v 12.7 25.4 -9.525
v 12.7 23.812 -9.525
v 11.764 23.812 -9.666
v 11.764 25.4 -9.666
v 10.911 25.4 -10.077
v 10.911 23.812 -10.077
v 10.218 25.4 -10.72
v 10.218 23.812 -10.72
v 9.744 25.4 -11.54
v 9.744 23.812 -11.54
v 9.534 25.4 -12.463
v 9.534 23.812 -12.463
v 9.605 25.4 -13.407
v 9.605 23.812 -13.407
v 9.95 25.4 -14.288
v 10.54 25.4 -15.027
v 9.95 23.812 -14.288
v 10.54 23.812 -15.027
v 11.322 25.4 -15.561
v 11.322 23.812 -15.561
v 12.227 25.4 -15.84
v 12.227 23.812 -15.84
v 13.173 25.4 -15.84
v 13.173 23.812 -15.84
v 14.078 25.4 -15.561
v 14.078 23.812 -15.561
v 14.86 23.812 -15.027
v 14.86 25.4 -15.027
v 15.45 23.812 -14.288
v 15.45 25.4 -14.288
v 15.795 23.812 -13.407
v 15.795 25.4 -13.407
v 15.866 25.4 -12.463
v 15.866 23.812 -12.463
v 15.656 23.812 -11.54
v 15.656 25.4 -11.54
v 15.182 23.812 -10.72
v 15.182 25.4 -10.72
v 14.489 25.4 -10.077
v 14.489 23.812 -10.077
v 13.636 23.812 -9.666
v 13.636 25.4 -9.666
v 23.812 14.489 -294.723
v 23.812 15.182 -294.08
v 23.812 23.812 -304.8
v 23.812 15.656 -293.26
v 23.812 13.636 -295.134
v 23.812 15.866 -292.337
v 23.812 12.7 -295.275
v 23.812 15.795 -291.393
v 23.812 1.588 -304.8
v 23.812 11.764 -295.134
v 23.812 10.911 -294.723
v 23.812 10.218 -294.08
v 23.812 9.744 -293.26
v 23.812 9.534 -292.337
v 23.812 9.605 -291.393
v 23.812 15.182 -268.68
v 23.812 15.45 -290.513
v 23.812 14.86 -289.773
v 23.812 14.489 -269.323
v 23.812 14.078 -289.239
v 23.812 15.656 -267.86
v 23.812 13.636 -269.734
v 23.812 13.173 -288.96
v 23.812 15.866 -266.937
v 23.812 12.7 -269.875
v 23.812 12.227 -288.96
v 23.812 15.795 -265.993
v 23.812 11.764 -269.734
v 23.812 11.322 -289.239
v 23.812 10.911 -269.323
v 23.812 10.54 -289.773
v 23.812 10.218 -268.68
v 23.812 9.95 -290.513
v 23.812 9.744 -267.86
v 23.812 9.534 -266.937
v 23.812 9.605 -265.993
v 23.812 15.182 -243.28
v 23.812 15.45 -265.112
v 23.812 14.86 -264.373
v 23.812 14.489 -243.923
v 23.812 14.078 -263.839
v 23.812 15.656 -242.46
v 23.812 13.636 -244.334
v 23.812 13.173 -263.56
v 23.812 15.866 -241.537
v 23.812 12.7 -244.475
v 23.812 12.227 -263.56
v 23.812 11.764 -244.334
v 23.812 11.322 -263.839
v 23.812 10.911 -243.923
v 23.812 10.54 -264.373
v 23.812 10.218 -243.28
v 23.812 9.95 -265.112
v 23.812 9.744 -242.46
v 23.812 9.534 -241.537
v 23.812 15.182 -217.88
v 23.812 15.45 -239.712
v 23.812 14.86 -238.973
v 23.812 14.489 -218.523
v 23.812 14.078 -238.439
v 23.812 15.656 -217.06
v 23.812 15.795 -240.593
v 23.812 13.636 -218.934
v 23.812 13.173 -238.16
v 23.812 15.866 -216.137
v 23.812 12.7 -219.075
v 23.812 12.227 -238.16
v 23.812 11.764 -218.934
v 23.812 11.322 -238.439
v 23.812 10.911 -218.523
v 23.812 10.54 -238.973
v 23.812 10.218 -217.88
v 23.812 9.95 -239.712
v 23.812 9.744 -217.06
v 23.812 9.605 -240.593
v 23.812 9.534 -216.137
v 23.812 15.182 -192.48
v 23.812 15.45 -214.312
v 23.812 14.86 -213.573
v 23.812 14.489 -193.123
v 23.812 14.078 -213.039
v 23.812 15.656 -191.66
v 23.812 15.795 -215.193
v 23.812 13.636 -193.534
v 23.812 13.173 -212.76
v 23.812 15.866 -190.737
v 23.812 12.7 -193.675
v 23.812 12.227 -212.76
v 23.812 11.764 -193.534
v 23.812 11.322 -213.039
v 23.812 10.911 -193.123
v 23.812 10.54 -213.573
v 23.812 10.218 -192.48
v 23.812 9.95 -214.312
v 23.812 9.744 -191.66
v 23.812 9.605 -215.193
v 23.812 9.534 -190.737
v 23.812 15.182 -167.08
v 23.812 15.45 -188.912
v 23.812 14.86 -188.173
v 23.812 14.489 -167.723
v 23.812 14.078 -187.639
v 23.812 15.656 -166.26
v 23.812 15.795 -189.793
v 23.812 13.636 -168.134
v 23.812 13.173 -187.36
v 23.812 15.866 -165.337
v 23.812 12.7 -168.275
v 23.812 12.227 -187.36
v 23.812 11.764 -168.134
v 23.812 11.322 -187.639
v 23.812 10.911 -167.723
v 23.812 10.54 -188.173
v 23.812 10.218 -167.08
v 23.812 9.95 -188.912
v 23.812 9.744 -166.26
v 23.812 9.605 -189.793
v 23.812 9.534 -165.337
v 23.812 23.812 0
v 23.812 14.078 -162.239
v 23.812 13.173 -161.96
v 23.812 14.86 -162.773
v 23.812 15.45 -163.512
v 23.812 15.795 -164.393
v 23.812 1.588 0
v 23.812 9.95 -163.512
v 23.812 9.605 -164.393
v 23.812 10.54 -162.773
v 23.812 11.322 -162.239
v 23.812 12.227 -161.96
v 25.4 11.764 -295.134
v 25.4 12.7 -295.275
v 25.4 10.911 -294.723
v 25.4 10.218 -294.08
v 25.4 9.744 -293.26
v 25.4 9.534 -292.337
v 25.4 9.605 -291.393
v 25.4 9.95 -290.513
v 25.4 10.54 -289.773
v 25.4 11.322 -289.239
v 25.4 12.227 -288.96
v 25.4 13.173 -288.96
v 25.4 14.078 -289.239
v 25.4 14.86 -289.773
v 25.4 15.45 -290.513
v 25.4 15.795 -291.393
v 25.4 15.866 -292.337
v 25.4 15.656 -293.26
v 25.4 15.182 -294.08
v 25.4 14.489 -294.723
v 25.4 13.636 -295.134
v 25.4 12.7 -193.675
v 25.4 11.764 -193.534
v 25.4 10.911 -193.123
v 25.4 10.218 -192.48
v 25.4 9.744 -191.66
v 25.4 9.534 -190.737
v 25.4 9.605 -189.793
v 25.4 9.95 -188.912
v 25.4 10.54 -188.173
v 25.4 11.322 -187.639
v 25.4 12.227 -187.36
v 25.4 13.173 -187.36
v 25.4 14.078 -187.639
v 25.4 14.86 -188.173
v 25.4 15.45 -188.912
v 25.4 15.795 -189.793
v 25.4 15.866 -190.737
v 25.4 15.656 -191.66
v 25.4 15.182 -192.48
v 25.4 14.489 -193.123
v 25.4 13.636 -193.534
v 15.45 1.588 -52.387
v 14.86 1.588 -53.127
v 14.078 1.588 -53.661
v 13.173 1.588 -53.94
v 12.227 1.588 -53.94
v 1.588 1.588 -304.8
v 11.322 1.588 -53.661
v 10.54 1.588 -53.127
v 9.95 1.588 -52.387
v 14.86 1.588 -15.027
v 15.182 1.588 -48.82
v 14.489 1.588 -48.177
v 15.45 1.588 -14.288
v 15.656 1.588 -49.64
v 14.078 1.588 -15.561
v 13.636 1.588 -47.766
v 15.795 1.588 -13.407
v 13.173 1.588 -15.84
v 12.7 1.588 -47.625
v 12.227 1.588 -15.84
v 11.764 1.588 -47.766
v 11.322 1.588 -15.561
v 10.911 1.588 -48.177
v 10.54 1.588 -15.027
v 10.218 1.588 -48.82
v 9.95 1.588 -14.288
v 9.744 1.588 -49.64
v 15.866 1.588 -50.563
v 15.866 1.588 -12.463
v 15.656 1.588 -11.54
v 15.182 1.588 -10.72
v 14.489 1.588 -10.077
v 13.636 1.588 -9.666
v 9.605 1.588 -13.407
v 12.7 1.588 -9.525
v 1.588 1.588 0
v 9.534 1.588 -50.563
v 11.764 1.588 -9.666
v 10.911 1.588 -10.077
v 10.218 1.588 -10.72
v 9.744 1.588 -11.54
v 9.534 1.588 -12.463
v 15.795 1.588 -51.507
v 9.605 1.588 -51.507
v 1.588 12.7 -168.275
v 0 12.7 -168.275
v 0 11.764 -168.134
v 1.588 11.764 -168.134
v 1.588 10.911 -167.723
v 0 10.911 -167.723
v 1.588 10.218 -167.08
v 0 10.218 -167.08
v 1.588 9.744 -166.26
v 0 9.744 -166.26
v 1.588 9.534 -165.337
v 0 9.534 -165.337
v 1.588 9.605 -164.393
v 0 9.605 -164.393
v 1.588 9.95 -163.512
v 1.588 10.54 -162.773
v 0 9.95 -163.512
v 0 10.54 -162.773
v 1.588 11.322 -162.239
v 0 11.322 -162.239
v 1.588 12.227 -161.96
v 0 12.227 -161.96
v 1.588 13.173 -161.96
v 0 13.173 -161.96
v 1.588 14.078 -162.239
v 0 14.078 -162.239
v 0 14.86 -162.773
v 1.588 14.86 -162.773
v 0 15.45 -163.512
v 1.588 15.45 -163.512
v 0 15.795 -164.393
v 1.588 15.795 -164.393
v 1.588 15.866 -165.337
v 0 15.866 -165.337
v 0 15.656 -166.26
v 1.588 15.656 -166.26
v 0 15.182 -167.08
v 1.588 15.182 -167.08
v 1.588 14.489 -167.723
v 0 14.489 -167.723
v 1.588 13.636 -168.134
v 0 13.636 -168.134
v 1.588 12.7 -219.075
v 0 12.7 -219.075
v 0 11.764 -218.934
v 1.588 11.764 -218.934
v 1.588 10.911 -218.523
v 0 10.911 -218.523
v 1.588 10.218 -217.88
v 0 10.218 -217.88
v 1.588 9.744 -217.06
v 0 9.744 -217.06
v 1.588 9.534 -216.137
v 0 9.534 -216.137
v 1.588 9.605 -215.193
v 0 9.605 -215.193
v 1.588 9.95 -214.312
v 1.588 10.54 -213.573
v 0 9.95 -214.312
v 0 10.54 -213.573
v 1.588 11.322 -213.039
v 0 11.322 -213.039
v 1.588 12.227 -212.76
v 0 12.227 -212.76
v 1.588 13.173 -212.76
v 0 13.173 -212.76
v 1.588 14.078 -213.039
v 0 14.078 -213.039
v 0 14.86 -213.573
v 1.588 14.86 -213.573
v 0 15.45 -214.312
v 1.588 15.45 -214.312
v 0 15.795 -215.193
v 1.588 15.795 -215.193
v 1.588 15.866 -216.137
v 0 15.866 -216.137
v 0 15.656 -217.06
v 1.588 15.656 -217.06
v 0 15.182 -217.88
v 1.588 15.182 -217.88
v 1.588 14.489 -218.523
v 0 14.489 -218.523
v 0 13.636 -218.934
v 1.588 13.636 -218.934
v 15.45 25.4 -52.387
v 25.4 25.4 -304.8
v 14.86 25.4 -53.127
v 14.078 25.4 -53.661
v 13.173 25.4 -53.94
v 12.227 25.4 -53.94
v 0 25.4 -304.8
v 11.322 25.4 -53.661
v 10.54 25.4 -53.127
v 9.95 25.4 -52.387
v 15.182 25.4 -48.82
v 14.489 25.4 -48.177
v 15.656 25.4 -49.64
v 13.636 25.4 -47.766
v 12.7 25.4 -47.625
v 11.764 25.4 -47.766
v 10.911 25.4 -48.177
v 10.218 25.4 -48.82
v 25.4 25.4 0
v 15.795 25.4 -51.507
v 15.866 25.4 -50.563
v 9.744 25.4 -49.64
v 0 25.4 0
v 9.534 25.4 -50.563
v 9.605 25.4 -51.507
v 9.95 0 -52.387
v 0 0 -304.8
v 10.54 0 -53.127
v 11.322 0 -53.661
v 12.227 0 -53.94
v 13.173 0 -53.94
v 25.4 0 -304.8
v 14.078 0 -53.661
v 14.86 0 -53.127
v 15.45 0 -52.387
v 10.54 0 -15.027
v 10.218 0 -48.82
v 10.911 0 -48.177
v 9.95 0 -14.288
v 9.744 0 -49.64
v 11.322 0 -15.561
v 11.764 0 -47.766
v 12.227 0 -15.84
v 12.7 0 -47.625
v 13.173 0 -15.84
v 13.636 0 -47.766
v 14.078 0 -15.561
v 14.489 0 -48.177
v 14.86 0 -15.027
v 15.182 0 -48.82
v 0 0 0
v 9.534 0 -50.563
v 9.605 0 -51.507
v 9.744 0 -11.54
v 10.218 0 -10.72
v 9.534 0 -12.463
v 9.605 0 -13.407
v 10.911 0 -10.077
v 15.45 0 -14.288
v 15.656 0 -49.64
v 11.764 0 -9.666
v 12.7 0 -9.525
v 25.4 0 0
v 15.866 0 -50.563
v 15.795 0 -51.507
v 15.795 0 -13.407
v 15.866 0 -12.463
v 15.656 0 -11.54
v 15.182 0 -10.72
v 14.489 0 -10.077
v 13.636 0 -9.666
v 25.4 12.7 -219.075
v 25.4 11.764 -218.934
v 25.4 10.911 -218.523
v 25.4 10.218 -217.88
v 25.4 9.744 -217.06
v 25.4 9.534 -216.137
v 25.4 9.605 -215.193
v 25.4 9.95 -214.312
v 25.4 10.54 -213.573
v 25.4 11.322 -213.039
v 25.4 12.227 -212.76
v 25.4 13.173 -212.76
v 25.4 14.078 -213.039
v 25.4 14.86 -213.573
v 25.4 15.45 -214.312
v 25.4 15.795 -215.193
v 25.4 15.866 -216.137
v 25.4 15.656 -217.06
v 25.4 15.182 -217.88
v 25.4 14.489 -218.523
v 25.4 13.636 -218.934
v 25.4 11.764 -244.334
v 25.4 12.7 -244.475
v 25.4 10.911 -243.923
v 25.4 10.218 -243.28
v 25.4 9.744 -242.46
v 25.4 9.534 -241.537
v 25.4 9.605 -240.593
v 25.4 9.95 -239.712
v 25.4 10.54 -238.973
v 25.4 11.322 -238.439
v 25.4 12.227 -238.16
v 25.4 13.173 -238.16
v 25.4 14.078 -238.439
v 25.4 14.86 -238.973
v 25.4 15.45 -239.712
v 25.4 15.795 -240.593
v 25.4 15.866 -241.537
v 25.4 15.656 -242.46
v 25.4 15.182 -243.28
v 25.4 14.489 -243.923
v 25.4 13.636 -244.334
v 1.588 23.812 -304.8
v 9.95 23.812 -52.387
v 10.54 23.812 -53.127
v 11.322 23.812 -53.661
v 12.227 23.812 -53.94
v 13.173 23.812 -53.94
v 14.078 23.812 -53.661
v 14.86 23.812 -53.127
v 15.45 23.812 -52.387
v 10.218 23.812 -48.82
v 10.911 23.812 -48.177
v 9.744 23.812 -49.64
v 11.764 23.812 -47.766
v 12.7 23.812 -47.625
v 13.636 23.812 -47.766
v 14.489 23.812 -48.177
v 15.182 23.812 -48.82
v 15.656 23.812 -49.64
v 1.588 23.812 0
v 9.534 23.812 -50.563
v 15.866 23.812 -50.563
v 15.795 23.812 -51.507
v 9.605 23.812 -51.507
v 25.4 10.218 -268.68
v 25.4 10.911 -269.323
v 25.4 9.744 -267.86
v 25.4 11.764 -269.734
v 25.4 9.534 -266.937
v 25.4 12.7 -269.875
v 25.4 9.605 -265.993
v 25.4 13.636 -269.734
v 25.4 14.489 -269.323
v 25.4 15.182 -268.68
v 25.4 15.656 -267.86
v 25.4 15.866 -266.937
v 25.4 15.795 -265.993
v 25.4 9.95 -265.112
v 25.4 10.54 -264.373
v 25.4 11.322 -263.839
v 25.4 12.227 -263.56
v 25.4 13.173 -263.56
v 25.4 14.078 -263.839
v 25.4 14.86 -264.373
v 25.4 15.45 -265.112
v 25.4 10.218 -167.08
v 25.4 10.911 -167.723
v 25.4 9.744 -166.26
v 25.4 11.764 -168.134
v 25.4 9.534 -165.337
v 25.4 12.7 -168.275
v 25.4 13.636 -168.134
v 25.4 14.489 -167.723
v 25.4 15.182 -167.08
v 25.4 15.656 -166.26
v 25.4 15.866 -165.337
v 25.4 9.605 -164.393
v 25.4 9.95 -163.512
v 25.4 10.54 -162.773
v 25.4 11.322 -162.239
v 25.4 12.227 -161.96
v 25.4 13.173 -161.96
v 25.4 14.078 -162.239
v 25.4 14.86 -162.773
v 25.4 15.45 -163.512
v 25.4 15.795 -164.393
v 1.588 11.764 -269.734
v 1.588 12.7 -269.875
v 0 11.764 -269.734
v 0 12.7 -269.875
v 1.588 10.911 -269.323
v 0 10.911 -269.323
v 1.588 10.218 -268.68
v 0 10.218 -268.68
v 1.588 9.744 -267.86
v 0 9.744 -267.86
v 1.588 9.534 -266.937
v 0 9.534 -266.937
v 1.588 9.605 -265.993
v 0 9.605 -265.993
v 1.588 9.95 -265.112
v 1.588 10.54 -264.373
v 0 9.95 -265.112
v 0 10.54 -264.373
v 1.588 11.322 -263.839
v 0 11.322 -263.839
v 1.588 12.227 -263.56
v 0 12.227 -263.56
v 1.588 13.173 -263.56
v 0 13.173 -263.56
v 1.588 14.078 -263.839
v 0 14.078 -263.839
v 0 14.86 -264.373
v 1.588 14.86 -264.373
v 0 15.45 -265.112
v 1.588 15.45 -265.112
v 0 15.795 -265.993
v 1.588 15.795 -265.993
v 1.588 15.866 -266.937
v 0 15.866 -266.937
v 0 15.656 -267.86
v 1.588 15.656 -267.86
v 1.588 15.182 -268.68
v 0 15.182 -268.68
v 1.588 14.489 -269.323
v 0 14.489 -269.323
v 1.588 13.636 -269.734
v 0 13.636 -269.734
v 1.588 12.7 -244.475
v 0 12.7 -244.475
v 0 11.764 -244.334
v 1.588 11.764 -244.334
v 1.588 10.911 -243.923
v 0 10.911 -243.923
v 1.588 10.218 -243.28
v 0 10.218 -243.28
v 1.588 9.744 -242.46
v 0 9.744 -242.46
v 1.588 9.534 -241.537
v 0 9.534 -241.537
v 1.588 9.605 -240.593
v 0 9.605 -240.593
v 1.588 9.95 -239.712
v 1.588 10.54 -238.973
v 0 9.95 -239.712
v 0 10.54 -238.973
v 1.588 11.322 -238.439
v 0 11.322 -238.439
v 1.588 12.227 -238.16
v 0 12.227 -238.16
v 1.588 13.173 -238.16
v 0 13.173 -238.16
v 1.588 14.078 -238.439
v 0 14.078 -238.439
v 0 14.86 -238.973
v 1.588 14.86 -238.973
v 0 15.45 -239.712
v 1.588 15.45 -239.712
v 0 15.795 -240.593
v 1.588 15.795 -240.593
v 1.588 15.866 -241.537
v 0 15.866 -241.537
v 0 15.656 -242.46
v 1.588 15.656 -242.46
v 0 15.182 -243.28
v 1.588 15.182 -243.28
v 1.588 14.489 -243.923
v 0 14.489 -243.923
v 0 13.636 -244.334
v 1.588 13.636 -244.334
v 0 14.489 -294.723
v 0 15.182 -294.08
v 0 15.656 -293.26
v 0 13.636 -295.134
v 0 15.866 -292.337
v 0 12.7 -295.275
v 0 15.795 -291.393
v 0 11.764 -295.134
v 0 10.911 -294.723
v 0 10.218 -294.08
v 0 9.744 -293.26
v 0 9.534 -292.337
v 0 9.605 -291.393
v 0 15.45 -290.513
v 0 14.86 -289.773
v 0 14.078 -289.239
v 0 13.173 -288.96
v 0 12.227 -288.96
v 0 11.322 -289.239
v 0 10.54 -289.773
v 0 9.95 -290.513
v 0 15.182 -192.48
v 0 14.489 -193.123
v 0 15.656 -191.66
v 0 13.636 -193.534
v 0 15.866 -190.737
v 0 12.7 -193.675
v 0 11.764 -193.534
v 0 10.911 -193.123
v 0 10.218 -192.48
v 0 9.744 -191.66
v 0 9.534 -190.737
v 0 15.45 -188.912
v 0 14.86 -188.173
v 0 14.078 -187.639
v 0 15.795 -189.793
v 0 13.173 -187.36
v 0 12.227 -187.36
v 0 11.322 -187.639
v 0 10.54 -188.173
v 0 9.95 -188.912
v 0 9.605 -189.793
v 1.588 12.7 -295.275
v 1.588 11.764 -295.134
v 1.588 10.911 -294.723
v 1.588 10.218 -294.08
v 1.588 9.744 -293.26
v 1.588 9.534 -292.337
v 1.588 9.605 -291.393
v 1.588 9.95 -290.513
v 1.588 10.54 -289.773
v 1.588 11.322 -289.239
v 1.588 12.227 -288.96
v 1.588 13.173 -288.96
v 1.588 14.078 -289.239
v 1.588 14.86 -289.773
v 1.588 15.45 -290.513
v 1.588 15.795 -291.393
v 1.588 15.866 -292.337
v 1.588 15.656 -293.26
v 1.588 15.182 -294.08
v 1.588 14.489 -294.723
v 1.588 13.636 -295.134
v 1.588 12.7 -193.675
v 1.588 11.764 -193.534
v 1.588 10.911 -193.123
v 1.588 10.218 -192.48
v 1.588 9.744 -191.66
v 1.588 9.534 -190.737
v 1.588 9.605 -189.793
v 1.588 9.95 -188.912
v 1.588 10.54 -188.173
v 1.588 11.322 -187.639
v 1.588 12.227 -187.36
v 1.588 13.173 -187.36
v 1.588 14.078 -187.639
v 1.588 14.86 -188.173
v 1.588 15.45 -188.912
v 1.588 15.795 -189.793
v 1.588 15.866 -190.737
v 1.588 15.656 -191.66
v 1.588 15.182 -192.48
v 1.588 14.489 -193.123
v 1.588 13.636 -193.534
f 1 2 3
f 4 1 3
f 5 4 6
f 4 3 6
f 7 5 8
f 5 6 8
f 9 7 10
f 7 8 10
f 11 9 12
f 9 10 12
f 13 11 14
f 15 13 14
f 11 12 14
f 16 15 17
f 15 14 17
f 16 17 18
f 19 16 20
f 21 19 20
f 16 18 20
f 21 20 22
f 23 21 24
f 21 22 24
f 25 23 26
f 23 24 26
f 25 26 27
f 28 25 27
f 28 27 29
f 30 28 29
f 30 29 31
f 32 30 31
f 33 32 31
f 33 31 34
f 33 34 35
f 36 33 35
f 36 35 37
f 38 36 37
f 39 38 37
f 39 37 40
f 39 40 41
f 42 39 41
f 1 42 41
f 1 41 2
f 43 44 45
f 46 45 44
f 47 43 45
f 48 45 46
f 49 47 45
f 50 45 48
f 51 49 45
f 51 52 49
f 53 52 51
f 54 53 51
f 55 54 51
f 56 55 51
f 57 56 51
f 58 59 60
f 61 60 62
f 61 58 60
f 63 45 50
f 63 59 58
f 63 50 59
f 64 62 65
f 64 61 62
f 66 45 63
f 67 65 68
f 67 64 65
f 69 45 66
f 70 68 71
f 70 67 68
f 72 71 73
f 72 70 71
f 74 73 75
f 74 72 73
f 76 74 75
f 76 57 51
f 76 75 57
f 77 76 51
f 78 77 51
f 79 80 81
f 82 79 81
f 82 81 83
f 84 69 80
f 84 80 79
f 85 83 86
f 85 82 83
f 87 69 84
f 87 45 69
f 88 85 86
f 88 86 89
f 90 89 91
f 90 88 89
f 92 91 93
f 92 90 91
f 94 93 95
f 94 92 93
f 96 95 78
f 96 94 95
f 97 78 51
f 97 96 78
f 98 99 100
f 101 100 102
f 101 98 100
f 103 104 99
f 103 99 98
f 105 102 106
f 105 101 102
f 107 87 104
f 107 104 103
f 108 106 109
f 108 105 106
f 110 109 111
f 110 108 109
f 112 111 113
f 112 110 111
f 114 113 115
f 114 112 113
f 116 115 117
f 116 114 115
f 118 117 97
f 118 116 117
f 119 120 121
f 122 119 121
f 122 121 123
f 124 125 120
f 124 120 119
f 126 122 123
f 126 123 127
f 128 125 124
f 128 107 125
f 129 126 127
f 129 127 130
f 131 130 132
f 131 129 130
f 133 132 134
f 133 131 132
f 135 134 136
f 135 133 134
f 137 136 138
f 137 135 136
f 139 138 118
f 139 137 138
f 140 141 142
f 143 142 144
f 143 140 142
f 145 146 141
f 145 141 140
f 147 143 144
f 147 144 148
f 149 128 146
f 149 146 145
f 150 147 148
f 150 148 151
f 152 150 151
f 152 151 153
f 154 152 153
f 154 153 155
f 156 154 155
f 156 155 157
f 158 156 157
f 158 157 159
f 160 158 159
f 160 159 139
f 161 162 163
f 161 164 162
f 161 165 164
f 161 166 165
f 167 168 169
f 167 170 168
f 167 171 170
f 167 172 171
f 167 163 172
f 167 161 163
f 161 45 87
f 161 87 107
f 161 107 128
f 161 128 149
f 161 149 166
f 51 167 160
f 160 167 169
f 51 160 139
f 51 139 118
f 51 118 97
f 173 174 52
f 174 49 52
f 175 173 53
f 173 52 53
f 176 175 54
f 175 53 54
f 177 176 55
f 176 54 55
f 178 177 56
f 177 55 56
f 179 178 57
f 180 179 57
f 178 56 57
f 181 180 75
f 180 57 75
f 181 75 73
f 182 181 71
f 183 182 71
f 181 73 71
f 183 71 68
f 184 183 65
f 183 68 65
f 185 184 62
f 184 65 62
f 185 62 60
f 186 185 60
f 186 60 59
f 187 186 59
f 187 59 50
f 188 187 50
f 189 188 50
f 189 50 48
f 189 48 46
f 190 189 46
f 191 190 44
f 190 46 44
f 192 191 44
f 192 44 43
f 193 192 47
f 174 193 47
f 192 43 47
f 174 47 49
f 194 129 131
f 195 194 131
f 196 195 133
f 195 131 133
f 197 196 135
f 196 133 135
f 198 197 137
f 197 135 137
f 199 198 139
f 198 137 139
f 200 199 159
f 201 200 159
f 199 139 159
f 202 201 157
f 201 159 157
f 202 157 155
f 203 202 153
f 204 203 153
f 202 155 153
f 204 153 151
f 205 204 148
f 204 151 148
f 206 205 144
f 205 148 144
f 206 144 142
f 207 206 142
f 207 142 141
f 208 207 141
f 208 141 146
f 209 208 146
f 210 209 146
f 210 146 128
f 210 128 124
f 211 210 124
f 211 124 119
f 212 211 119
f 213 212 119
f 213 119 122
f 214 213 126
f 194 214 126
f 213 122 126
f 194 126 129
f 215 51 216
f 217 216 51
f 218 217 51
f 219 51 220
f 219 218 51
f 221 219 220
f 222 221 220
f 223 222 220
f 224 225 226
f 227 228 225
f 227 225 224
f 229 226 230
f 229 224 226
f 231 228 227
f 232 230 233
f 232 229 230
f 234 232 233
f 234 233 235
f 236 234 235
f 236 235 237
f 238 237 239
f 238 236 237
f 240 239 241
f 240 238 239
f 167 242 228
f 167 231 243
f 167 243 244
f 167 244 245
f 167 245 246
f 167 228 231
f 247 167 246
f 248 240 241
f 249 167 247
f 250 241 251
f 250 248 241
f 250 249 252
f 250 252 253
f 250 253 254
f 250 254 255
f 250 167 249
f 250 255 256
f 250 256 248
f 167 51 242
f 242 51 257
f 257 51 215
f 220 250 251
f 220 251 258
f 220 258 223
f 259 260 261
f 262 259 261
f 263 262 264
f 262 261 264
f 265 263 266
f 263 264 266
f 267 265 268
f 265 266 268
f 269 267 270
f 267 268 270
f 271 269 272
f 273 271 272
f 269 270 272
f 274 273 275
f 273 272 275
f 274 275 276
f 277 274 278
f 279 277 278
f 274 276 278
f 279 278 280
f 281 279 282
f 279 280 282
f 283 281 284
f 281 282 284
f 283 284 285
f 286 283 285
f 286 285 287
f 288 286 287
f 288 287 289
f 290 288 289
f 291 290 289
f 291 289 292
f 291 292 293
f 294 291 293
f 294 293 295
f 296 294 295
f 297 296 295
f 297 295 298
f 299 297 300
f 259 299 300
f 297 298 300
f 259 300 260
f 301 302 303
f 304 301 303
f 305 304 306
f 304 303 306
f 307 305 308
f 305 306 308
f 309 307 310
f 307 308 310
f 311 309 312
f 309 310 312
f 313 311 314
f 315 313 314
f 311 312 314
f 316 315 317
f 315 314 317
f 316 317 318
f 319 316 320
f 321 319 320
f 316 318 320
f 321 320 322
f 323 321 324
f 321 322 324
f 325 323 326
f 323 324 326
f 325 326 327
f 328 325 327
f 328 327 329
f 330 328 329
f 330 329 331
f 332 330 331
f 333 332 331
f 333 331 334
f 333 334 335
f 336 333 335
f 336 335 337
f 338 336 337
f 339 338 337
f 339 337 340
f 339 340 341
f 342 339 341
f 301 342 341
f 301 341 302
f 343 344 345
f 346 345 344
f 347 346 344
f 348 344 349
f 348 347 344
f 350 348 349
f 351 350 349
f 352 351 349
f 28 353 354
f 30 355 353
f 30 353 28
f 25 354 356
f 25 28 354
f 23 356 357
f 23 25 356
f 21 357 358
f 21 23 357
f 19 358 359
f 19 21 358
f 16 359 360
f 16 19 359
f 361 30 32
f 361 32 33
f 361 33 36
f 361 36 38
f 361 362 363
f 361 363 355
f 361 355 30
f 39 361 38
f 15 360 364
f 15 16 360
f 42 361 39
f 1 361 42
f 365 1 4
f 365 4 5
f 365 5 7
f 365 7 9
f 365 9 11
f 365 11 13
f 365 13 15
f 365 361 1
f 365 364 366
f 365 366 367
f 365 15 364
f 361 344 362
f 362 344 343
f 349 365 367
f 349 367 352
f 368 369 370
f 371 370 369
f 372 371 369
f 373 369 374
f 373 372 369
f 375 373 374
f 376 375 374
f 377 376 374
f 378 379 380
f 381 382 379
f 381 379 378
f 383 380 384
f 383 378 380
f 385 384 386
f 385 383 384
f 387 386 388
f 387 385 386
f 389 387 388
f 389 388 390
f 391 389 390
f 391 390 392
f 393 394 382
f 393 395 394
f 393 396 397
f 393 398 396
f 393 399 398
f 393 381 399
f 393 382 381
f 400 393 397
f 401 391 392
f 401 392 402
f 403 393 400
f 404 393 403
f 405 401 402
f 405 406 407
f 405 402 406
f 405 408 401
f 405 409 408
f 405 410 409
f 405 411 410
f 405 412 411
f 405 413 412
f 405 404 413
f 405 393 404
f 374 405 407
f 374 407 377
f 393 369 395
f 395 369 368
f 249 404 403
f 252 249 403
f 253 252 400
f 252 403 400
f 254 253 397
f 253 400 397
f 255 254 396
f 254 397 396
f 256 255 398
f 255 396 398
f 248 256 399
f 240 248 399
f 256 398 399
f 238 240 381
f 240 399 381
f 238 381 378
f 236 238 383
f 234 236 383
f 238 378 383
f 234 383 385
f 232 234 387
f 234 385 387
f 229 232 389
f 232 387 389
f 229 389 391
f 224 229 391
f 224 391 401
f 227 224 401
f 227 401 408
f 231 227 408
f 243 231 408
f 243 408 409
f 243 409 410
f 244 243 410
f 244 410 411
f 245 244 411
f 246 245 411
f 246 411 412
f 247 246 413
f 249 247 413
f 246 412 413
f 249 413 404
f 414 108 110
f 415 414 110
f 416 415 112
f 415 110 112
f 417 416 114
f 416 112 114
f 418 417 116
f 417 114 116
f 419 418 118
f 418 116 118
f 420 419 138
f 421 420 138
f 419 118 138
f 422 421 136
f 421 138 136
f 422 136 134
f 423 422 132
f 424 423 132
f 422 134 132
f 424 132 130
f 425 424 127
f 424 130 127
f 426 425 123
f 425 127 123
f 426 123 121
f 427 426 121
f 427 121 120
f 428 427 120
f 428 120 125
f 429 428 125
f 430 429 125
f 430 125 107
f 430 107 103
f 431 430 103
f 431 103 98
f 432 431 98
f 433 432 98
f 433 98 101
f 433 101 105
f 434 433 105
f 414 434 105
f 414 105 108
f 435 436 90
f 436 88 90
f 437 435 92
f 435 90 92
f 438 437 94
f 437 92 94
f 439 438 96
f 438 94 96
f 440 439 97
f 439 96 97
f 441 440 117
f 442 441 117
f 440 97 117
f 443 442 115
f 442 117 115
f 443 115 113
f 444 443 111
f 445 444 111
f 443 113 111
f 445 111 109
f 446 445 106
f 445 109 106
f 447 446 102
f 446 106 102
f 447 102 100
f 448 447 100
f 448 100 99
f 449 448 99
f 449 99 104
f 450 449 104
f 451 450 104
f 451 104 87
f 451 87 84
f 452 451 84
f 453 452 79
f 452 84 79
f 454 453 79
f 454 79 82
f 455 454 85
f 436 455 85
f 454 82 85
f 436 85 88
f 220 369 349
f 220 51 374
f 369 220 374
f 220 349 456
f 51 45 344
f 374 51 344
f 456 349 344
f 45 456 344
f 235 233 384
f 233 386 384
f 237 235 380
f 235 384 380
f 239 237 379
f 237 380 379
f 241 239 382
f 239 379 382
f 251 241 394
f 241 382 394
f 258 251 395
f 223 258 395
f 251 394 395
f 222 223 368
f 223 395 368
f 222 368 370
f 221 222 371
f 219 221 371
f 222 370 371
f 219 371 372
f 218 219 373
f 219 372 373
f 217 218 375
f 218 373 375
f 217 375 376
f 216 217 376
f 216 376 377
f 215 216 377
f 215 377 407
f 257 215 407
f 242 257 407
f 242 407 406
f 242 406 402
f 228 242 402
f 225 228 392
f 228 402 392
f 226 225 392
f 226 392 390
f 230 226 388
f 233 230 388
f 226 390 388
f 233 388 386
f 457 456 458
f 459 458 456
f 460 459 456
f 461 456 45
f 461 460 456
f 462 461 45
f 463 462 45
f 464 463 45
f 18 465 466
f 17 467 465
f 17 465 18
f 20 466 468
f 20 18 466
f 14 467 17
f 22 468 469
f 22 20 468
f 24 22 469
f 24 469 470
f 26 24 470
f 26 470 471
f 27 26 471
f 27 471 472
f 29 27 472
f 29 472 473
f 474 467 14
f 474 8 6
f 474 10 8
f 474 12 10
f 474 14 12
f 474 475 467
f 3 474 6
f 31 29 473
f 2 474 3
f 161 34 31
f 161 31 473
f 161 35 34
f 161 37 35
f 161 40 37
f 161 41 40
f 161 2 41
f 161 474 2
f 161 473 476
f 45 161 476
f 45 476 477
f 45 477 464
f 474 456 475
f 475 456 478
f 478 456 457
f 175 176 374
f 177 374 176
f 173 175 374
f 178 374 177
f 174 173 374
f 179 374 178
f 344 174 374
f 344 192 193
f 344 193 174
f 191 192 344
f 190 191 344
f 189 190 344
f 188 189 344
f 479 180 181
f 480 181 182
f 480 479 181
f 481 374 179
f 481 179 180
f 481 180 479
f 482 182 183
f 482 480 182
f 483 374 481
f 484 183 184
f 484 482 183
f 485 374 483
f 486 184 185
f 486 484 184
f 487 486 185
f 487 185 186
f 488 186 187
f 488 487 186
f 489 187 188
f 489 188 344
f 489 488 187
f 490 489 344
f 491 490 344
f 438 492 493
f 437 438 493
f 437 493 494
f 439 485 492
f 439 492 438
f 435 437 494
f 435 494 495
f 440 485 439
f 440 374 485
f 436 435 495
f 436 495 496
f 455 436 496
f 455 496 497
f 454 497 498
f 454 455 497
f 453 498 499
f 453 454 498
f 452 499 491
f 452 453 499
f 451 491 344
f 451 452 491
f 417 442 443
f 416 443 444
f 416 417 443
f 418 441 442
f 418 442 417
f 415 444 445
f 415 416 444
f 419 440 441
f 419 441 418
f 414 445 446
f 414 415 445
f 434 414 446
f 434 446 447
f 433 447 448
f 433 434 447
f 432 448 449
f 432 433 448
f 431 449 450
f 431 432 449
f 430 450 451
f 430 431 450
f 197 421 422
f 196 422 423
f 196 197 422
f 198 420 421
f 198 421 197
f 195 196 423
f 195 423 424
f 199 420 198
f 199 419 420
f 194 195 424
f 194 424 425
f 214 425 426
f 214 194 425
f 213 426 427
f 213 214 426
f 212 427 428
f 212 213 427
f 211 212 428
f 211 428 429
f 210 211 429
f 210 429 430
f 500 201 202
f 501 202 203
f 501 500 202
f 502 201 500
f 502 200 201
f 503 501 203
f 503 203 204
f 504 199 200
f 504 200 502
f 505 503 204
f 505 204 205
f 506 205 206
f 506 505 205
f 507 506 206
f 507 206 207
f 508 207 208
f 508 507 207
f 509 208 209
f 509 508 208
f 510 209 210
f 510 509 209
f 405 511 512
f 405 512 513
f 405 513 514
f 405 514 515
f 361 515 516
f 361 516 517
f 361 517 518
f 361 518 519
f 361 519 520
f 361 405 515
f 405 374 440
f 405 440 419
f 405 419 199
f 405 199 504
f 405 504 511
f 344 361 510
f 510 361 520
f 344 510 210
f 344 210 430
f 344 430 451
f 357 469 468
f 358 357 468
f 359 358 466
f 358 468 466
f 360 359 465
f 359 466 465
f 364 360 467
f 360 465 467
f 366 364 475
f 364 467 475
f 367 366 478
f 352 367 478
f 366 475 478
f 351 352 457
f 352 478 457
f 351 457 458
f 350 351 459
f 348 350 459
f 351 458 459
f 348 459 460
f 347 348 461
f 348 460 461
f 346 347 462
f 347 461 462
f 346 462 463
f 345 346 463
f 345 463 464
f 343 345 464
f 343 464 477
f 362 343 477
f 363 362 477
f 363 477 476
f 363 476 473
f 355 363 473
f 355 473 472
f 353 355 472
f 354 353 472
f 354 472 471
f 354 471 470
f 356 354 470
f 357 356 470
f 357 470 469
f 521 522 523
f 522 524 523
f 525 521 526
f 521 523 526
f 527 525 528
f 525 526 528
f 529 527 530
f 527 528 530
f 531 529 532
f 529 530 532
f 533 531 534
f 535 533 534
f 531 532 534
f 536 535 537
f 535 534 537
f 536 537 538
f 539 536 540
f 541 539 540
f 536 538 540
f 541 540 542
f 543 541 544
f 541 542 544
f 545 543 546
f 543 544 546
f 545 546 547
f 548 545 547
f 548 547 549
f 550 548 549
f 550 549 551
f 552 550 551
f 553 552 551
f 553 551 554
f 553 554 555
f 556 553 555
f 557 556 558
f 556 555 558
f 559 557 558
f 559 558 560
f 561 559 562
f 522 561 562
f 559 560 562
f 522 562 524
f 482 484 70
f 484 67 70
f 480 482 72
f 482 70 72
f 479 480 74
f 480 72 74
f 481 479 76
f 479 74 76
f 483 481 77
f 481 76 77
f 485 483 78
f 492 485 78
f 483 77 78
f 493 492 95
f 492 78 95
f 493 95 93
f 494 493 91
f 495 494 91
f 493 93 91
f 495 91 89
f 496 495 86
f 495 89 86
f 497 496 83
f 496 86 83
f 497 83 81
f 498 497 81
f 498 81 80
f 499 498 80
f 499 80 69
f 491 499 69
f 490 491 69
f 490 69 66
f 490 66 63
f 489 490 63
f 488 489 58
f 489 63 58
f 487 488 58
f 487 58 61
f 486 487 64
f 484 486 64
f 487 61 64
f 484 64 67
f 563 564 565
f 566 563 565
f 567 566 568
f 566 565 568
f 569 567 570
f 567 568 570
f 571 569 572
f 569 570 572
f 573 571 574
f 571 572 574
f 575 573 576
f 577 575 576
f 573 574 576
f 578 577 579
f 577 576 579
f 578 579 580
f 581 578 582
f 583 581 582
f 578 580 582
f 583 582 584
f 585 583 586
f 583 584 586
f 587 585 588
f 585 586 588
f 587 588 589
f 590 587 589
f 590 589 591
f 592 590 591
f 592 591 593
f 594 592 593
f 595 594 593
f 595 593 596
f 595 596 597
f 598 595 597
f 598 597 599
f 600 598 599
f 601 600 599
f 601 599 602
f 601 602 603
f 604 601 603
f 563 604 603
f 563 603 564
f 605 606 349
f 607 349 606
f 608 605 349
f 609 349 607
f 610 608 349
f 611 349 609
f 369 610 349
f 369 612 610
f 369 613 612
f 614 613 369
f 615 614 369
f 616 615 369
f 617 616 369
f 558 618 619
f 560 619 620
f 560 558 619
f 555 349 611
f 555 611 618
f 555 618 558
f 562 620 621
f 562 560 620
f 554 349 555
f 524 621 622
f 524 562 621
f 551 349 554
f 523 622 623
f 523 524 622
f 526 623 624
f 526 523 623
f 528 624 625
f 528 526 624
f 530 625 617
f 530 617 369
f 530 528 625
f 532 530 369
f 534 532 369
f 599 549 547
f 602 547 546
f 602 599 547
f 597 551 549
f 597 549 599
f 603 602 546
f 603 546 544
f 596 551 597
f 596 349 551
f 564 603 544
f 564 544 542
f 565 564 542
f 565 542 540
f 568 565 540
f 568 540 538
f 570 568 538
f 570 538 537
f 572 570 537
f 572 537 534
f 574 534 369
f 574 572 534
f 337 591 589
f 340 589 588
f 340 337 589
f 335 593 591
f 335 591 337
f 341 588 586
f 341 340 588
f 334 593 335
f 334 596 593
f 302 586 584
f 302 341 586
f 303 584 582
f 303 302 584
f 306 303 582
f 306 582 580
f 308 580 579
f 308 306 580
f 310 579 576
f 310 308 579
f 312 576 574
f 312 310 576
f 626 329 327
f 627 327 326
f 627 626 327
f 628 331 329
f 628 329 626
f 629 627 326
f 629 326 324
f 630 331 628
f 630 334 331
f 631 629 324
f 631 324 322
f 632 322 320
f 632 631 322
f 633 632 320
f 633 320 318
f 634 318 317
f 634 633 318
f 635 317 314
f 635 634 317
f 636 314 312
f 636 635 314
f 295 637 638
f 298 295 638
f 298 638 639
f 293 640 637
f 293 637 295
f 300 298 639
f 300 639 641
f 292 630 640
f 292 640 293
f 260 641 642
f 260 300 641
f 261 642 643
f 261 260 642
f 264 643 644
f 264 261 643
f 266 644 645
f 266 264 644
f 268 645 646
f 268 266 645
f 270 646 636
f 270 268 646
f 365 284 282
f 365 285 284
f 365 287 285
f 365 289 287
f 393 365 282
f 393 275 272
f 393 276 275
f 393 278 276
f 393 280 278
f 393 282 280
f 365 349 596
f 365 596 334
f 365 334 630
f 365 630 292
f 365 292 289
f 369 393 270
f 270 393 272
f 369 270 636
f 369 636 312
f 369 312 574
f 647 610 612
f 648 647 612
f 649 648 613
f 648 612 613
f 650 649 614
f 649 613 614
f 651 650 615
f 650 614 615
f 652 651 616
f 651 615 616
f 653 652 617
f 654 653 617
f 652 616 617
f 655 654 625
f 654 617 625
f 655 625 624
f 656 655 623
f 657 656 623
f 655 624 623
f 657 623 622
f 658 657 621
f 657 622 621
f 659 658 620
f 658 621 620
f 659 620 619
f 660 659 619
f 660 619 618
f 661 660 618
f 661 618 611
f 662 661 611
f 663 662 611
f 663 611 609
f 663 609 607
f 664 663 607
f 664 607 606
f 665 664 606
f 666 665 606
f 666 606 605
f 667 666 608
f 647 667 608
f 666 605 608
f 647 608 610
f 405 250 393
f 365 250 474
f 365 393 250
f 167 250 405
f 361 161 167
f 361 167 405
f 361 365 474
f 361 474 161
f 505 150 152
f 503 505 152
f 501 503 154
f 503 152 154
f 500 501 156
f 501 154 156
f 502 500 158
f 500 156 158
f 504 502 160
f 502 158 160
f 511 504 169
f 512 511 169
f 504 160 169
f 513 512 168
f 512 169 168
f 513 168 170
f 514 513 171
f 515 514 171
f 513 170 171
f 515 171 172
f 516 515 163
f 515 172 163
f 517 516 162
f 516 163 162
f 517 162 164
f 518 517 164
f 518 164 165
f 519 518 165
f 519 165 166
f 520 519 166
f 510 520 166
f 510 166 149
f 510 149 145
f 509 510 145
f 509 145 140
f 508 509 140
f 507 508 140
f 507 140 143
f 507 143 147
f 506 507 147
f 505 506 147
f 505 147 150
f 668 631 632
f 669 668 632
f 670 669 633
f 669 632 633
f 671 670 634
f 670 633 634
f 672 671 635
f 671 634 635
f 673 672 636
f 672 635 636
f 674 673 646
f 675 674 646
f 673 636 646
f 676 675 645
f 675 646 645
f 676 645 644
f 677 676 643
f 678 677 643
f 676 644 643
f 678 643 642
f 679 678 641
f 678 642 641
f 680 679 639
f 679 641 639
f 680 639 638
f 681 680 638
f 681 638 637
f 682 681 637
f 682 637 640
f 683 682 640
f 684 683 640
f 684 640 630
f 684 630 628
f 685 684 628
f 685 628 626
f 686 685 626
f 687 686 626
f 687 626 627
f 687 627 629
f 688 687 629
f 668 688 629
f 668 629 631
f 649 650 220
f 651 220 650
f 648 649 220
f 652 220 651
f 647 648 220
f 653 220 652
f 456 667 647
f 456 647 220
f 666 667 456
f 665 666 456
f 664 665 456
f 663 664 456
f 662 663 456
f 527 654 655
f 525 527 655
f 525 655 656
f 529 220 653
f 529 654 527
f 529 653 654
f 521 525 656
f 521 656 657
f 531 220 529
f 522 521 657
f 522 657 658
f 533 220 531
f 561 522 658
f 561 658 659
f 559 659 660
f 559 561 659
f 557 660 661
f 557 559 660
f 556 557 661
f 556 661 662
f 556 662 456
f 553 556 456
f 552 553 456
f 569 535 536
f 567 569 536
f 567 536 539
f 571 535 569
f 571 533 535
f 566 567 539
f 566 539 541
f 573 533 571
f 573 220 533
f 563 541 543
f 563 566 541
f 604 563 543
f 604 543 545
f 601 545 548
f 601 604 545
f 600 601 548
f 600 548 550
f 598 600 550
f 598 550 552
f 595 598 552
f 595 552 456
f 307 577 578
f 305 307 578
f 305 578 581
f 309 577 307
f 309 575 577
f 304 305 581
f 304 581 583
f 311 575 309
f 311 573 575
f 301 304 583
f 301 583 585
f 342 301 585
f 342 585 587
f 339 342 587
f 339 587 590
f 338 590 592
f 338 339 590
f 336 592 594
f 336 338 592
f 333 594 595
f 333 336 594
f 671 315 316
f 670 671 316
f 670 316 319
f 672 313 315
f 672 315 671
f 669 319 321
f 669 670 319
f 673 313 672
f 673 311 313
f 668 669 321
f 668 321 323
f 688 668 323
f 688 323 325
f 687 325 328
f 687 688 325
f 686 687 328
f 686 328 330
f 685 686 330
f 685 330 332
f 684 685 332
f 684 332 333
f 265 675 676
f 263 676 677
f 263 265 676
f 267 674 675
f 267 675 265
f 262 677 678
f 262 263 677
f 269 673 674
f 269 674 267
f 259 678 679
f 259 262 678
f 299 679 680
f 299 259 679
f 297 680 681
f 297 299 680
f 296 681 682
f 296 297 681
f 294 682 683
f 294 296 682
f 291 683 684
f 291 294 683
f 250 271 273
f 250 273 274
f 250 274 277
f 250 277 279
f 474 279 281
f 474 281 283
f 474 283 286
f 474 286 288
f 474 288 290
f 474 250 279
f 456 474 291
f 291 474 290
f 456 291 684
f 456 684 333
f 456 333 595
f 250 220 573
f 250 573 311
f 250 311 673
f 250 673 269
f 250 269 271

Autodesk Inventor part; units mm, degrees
ref_plane "YZ Plane" through (0, 0, 0) normal (1, 0, 0) x (0, 1, 0)
ref_plane "XZ Plane" through (0, 0, 0) normal (0, 1, 0) x (-1, 0, 0)
ref_plane "XY Plane" through (0, 0, 0) normal (0, 0, 1) x (1, 0, 0)
sketch "Sketch1" plane through (0, 0, 0) normal (0, 0, 1) x (1, 0, 0)
  line L0 (0, 0) -> (25.4, 0)
  line L1 (25.4, 0) -> (25.4, 25.4)
  line L2 (25.4, 25.4) -> (0, 25.4)
  line L3 (0, 25.4) -> (0, 0)
  line L4 (1.5875, 23.8125) -> (23.8125, 23.8125)
  line L5 (23.8125, 23.8125) -> (23.8125, 1.5875)
  line L6 (23.8125, 1.5875) -> (1.5875, 1.5875)
  line L7 (1.5875, 1.5875) -> (1.5875, 23.8125)
  dimension "d0" = 25.4
  dimension "d1" = 25.4
  dimension "d2" = 1.5875
extrude "Extrusion1" add sketch "Sketch1" against normal blind 304.8
sketch "Sketch2" plane through (0, 25.4, 0) normal (0, 1, 0) x (1, 0, 0)
  line L0 (25.4, 0) -> (0, 0) projected
  point P0 (12.7, 12.7)
  point P1 (12.7, 50.8)
  dimension "d5" = 12.7
  dimension "d6" = 38.1
hole "Hole1" at (12.7, 25.4, -12.7) at (12.7, 25.4, -50.8) direction (0, -1, 0) diameter 6.35 depth 25.4 tip angle 118
sketch "Sketch3" plane through (25.4, 0, 0) normal (1, 0, 0) x (0, 0, -1)
  line L0 (304.8, 0) -> (304.8, 25.4) projected
  point P0 (292.1, 12.7)
  point P1 (266.7, 12.7)
  point P2 (241.3, 12.7)
  point P3 (215.9, 12.7)
  point P4 (190.5, 12.7)
  point P5 (165.1, 12.7)
  dimension "d14" = 25.4
  dimension "d15" = 25.4
  dimension "d16" = 25.4
  dimension "d17" = 25.4
  dimension "d18" = 12.7
  dimension "d26" = 25.4
hole "Hole2" at (25.4, 12.7, -292.1) at (25.4, 12.7, -266.7) at (25.4, 12.7, -241.3) at (25.4, 12.7, -215.9) at (25.4, 12.7, -190.5) at (25.4, 12.7, -165.1) direction (-1, 0, 0) diameter 6.35 depth 25.4 tip angle 118
properties part number "1tube_10_framegrabberarm"
